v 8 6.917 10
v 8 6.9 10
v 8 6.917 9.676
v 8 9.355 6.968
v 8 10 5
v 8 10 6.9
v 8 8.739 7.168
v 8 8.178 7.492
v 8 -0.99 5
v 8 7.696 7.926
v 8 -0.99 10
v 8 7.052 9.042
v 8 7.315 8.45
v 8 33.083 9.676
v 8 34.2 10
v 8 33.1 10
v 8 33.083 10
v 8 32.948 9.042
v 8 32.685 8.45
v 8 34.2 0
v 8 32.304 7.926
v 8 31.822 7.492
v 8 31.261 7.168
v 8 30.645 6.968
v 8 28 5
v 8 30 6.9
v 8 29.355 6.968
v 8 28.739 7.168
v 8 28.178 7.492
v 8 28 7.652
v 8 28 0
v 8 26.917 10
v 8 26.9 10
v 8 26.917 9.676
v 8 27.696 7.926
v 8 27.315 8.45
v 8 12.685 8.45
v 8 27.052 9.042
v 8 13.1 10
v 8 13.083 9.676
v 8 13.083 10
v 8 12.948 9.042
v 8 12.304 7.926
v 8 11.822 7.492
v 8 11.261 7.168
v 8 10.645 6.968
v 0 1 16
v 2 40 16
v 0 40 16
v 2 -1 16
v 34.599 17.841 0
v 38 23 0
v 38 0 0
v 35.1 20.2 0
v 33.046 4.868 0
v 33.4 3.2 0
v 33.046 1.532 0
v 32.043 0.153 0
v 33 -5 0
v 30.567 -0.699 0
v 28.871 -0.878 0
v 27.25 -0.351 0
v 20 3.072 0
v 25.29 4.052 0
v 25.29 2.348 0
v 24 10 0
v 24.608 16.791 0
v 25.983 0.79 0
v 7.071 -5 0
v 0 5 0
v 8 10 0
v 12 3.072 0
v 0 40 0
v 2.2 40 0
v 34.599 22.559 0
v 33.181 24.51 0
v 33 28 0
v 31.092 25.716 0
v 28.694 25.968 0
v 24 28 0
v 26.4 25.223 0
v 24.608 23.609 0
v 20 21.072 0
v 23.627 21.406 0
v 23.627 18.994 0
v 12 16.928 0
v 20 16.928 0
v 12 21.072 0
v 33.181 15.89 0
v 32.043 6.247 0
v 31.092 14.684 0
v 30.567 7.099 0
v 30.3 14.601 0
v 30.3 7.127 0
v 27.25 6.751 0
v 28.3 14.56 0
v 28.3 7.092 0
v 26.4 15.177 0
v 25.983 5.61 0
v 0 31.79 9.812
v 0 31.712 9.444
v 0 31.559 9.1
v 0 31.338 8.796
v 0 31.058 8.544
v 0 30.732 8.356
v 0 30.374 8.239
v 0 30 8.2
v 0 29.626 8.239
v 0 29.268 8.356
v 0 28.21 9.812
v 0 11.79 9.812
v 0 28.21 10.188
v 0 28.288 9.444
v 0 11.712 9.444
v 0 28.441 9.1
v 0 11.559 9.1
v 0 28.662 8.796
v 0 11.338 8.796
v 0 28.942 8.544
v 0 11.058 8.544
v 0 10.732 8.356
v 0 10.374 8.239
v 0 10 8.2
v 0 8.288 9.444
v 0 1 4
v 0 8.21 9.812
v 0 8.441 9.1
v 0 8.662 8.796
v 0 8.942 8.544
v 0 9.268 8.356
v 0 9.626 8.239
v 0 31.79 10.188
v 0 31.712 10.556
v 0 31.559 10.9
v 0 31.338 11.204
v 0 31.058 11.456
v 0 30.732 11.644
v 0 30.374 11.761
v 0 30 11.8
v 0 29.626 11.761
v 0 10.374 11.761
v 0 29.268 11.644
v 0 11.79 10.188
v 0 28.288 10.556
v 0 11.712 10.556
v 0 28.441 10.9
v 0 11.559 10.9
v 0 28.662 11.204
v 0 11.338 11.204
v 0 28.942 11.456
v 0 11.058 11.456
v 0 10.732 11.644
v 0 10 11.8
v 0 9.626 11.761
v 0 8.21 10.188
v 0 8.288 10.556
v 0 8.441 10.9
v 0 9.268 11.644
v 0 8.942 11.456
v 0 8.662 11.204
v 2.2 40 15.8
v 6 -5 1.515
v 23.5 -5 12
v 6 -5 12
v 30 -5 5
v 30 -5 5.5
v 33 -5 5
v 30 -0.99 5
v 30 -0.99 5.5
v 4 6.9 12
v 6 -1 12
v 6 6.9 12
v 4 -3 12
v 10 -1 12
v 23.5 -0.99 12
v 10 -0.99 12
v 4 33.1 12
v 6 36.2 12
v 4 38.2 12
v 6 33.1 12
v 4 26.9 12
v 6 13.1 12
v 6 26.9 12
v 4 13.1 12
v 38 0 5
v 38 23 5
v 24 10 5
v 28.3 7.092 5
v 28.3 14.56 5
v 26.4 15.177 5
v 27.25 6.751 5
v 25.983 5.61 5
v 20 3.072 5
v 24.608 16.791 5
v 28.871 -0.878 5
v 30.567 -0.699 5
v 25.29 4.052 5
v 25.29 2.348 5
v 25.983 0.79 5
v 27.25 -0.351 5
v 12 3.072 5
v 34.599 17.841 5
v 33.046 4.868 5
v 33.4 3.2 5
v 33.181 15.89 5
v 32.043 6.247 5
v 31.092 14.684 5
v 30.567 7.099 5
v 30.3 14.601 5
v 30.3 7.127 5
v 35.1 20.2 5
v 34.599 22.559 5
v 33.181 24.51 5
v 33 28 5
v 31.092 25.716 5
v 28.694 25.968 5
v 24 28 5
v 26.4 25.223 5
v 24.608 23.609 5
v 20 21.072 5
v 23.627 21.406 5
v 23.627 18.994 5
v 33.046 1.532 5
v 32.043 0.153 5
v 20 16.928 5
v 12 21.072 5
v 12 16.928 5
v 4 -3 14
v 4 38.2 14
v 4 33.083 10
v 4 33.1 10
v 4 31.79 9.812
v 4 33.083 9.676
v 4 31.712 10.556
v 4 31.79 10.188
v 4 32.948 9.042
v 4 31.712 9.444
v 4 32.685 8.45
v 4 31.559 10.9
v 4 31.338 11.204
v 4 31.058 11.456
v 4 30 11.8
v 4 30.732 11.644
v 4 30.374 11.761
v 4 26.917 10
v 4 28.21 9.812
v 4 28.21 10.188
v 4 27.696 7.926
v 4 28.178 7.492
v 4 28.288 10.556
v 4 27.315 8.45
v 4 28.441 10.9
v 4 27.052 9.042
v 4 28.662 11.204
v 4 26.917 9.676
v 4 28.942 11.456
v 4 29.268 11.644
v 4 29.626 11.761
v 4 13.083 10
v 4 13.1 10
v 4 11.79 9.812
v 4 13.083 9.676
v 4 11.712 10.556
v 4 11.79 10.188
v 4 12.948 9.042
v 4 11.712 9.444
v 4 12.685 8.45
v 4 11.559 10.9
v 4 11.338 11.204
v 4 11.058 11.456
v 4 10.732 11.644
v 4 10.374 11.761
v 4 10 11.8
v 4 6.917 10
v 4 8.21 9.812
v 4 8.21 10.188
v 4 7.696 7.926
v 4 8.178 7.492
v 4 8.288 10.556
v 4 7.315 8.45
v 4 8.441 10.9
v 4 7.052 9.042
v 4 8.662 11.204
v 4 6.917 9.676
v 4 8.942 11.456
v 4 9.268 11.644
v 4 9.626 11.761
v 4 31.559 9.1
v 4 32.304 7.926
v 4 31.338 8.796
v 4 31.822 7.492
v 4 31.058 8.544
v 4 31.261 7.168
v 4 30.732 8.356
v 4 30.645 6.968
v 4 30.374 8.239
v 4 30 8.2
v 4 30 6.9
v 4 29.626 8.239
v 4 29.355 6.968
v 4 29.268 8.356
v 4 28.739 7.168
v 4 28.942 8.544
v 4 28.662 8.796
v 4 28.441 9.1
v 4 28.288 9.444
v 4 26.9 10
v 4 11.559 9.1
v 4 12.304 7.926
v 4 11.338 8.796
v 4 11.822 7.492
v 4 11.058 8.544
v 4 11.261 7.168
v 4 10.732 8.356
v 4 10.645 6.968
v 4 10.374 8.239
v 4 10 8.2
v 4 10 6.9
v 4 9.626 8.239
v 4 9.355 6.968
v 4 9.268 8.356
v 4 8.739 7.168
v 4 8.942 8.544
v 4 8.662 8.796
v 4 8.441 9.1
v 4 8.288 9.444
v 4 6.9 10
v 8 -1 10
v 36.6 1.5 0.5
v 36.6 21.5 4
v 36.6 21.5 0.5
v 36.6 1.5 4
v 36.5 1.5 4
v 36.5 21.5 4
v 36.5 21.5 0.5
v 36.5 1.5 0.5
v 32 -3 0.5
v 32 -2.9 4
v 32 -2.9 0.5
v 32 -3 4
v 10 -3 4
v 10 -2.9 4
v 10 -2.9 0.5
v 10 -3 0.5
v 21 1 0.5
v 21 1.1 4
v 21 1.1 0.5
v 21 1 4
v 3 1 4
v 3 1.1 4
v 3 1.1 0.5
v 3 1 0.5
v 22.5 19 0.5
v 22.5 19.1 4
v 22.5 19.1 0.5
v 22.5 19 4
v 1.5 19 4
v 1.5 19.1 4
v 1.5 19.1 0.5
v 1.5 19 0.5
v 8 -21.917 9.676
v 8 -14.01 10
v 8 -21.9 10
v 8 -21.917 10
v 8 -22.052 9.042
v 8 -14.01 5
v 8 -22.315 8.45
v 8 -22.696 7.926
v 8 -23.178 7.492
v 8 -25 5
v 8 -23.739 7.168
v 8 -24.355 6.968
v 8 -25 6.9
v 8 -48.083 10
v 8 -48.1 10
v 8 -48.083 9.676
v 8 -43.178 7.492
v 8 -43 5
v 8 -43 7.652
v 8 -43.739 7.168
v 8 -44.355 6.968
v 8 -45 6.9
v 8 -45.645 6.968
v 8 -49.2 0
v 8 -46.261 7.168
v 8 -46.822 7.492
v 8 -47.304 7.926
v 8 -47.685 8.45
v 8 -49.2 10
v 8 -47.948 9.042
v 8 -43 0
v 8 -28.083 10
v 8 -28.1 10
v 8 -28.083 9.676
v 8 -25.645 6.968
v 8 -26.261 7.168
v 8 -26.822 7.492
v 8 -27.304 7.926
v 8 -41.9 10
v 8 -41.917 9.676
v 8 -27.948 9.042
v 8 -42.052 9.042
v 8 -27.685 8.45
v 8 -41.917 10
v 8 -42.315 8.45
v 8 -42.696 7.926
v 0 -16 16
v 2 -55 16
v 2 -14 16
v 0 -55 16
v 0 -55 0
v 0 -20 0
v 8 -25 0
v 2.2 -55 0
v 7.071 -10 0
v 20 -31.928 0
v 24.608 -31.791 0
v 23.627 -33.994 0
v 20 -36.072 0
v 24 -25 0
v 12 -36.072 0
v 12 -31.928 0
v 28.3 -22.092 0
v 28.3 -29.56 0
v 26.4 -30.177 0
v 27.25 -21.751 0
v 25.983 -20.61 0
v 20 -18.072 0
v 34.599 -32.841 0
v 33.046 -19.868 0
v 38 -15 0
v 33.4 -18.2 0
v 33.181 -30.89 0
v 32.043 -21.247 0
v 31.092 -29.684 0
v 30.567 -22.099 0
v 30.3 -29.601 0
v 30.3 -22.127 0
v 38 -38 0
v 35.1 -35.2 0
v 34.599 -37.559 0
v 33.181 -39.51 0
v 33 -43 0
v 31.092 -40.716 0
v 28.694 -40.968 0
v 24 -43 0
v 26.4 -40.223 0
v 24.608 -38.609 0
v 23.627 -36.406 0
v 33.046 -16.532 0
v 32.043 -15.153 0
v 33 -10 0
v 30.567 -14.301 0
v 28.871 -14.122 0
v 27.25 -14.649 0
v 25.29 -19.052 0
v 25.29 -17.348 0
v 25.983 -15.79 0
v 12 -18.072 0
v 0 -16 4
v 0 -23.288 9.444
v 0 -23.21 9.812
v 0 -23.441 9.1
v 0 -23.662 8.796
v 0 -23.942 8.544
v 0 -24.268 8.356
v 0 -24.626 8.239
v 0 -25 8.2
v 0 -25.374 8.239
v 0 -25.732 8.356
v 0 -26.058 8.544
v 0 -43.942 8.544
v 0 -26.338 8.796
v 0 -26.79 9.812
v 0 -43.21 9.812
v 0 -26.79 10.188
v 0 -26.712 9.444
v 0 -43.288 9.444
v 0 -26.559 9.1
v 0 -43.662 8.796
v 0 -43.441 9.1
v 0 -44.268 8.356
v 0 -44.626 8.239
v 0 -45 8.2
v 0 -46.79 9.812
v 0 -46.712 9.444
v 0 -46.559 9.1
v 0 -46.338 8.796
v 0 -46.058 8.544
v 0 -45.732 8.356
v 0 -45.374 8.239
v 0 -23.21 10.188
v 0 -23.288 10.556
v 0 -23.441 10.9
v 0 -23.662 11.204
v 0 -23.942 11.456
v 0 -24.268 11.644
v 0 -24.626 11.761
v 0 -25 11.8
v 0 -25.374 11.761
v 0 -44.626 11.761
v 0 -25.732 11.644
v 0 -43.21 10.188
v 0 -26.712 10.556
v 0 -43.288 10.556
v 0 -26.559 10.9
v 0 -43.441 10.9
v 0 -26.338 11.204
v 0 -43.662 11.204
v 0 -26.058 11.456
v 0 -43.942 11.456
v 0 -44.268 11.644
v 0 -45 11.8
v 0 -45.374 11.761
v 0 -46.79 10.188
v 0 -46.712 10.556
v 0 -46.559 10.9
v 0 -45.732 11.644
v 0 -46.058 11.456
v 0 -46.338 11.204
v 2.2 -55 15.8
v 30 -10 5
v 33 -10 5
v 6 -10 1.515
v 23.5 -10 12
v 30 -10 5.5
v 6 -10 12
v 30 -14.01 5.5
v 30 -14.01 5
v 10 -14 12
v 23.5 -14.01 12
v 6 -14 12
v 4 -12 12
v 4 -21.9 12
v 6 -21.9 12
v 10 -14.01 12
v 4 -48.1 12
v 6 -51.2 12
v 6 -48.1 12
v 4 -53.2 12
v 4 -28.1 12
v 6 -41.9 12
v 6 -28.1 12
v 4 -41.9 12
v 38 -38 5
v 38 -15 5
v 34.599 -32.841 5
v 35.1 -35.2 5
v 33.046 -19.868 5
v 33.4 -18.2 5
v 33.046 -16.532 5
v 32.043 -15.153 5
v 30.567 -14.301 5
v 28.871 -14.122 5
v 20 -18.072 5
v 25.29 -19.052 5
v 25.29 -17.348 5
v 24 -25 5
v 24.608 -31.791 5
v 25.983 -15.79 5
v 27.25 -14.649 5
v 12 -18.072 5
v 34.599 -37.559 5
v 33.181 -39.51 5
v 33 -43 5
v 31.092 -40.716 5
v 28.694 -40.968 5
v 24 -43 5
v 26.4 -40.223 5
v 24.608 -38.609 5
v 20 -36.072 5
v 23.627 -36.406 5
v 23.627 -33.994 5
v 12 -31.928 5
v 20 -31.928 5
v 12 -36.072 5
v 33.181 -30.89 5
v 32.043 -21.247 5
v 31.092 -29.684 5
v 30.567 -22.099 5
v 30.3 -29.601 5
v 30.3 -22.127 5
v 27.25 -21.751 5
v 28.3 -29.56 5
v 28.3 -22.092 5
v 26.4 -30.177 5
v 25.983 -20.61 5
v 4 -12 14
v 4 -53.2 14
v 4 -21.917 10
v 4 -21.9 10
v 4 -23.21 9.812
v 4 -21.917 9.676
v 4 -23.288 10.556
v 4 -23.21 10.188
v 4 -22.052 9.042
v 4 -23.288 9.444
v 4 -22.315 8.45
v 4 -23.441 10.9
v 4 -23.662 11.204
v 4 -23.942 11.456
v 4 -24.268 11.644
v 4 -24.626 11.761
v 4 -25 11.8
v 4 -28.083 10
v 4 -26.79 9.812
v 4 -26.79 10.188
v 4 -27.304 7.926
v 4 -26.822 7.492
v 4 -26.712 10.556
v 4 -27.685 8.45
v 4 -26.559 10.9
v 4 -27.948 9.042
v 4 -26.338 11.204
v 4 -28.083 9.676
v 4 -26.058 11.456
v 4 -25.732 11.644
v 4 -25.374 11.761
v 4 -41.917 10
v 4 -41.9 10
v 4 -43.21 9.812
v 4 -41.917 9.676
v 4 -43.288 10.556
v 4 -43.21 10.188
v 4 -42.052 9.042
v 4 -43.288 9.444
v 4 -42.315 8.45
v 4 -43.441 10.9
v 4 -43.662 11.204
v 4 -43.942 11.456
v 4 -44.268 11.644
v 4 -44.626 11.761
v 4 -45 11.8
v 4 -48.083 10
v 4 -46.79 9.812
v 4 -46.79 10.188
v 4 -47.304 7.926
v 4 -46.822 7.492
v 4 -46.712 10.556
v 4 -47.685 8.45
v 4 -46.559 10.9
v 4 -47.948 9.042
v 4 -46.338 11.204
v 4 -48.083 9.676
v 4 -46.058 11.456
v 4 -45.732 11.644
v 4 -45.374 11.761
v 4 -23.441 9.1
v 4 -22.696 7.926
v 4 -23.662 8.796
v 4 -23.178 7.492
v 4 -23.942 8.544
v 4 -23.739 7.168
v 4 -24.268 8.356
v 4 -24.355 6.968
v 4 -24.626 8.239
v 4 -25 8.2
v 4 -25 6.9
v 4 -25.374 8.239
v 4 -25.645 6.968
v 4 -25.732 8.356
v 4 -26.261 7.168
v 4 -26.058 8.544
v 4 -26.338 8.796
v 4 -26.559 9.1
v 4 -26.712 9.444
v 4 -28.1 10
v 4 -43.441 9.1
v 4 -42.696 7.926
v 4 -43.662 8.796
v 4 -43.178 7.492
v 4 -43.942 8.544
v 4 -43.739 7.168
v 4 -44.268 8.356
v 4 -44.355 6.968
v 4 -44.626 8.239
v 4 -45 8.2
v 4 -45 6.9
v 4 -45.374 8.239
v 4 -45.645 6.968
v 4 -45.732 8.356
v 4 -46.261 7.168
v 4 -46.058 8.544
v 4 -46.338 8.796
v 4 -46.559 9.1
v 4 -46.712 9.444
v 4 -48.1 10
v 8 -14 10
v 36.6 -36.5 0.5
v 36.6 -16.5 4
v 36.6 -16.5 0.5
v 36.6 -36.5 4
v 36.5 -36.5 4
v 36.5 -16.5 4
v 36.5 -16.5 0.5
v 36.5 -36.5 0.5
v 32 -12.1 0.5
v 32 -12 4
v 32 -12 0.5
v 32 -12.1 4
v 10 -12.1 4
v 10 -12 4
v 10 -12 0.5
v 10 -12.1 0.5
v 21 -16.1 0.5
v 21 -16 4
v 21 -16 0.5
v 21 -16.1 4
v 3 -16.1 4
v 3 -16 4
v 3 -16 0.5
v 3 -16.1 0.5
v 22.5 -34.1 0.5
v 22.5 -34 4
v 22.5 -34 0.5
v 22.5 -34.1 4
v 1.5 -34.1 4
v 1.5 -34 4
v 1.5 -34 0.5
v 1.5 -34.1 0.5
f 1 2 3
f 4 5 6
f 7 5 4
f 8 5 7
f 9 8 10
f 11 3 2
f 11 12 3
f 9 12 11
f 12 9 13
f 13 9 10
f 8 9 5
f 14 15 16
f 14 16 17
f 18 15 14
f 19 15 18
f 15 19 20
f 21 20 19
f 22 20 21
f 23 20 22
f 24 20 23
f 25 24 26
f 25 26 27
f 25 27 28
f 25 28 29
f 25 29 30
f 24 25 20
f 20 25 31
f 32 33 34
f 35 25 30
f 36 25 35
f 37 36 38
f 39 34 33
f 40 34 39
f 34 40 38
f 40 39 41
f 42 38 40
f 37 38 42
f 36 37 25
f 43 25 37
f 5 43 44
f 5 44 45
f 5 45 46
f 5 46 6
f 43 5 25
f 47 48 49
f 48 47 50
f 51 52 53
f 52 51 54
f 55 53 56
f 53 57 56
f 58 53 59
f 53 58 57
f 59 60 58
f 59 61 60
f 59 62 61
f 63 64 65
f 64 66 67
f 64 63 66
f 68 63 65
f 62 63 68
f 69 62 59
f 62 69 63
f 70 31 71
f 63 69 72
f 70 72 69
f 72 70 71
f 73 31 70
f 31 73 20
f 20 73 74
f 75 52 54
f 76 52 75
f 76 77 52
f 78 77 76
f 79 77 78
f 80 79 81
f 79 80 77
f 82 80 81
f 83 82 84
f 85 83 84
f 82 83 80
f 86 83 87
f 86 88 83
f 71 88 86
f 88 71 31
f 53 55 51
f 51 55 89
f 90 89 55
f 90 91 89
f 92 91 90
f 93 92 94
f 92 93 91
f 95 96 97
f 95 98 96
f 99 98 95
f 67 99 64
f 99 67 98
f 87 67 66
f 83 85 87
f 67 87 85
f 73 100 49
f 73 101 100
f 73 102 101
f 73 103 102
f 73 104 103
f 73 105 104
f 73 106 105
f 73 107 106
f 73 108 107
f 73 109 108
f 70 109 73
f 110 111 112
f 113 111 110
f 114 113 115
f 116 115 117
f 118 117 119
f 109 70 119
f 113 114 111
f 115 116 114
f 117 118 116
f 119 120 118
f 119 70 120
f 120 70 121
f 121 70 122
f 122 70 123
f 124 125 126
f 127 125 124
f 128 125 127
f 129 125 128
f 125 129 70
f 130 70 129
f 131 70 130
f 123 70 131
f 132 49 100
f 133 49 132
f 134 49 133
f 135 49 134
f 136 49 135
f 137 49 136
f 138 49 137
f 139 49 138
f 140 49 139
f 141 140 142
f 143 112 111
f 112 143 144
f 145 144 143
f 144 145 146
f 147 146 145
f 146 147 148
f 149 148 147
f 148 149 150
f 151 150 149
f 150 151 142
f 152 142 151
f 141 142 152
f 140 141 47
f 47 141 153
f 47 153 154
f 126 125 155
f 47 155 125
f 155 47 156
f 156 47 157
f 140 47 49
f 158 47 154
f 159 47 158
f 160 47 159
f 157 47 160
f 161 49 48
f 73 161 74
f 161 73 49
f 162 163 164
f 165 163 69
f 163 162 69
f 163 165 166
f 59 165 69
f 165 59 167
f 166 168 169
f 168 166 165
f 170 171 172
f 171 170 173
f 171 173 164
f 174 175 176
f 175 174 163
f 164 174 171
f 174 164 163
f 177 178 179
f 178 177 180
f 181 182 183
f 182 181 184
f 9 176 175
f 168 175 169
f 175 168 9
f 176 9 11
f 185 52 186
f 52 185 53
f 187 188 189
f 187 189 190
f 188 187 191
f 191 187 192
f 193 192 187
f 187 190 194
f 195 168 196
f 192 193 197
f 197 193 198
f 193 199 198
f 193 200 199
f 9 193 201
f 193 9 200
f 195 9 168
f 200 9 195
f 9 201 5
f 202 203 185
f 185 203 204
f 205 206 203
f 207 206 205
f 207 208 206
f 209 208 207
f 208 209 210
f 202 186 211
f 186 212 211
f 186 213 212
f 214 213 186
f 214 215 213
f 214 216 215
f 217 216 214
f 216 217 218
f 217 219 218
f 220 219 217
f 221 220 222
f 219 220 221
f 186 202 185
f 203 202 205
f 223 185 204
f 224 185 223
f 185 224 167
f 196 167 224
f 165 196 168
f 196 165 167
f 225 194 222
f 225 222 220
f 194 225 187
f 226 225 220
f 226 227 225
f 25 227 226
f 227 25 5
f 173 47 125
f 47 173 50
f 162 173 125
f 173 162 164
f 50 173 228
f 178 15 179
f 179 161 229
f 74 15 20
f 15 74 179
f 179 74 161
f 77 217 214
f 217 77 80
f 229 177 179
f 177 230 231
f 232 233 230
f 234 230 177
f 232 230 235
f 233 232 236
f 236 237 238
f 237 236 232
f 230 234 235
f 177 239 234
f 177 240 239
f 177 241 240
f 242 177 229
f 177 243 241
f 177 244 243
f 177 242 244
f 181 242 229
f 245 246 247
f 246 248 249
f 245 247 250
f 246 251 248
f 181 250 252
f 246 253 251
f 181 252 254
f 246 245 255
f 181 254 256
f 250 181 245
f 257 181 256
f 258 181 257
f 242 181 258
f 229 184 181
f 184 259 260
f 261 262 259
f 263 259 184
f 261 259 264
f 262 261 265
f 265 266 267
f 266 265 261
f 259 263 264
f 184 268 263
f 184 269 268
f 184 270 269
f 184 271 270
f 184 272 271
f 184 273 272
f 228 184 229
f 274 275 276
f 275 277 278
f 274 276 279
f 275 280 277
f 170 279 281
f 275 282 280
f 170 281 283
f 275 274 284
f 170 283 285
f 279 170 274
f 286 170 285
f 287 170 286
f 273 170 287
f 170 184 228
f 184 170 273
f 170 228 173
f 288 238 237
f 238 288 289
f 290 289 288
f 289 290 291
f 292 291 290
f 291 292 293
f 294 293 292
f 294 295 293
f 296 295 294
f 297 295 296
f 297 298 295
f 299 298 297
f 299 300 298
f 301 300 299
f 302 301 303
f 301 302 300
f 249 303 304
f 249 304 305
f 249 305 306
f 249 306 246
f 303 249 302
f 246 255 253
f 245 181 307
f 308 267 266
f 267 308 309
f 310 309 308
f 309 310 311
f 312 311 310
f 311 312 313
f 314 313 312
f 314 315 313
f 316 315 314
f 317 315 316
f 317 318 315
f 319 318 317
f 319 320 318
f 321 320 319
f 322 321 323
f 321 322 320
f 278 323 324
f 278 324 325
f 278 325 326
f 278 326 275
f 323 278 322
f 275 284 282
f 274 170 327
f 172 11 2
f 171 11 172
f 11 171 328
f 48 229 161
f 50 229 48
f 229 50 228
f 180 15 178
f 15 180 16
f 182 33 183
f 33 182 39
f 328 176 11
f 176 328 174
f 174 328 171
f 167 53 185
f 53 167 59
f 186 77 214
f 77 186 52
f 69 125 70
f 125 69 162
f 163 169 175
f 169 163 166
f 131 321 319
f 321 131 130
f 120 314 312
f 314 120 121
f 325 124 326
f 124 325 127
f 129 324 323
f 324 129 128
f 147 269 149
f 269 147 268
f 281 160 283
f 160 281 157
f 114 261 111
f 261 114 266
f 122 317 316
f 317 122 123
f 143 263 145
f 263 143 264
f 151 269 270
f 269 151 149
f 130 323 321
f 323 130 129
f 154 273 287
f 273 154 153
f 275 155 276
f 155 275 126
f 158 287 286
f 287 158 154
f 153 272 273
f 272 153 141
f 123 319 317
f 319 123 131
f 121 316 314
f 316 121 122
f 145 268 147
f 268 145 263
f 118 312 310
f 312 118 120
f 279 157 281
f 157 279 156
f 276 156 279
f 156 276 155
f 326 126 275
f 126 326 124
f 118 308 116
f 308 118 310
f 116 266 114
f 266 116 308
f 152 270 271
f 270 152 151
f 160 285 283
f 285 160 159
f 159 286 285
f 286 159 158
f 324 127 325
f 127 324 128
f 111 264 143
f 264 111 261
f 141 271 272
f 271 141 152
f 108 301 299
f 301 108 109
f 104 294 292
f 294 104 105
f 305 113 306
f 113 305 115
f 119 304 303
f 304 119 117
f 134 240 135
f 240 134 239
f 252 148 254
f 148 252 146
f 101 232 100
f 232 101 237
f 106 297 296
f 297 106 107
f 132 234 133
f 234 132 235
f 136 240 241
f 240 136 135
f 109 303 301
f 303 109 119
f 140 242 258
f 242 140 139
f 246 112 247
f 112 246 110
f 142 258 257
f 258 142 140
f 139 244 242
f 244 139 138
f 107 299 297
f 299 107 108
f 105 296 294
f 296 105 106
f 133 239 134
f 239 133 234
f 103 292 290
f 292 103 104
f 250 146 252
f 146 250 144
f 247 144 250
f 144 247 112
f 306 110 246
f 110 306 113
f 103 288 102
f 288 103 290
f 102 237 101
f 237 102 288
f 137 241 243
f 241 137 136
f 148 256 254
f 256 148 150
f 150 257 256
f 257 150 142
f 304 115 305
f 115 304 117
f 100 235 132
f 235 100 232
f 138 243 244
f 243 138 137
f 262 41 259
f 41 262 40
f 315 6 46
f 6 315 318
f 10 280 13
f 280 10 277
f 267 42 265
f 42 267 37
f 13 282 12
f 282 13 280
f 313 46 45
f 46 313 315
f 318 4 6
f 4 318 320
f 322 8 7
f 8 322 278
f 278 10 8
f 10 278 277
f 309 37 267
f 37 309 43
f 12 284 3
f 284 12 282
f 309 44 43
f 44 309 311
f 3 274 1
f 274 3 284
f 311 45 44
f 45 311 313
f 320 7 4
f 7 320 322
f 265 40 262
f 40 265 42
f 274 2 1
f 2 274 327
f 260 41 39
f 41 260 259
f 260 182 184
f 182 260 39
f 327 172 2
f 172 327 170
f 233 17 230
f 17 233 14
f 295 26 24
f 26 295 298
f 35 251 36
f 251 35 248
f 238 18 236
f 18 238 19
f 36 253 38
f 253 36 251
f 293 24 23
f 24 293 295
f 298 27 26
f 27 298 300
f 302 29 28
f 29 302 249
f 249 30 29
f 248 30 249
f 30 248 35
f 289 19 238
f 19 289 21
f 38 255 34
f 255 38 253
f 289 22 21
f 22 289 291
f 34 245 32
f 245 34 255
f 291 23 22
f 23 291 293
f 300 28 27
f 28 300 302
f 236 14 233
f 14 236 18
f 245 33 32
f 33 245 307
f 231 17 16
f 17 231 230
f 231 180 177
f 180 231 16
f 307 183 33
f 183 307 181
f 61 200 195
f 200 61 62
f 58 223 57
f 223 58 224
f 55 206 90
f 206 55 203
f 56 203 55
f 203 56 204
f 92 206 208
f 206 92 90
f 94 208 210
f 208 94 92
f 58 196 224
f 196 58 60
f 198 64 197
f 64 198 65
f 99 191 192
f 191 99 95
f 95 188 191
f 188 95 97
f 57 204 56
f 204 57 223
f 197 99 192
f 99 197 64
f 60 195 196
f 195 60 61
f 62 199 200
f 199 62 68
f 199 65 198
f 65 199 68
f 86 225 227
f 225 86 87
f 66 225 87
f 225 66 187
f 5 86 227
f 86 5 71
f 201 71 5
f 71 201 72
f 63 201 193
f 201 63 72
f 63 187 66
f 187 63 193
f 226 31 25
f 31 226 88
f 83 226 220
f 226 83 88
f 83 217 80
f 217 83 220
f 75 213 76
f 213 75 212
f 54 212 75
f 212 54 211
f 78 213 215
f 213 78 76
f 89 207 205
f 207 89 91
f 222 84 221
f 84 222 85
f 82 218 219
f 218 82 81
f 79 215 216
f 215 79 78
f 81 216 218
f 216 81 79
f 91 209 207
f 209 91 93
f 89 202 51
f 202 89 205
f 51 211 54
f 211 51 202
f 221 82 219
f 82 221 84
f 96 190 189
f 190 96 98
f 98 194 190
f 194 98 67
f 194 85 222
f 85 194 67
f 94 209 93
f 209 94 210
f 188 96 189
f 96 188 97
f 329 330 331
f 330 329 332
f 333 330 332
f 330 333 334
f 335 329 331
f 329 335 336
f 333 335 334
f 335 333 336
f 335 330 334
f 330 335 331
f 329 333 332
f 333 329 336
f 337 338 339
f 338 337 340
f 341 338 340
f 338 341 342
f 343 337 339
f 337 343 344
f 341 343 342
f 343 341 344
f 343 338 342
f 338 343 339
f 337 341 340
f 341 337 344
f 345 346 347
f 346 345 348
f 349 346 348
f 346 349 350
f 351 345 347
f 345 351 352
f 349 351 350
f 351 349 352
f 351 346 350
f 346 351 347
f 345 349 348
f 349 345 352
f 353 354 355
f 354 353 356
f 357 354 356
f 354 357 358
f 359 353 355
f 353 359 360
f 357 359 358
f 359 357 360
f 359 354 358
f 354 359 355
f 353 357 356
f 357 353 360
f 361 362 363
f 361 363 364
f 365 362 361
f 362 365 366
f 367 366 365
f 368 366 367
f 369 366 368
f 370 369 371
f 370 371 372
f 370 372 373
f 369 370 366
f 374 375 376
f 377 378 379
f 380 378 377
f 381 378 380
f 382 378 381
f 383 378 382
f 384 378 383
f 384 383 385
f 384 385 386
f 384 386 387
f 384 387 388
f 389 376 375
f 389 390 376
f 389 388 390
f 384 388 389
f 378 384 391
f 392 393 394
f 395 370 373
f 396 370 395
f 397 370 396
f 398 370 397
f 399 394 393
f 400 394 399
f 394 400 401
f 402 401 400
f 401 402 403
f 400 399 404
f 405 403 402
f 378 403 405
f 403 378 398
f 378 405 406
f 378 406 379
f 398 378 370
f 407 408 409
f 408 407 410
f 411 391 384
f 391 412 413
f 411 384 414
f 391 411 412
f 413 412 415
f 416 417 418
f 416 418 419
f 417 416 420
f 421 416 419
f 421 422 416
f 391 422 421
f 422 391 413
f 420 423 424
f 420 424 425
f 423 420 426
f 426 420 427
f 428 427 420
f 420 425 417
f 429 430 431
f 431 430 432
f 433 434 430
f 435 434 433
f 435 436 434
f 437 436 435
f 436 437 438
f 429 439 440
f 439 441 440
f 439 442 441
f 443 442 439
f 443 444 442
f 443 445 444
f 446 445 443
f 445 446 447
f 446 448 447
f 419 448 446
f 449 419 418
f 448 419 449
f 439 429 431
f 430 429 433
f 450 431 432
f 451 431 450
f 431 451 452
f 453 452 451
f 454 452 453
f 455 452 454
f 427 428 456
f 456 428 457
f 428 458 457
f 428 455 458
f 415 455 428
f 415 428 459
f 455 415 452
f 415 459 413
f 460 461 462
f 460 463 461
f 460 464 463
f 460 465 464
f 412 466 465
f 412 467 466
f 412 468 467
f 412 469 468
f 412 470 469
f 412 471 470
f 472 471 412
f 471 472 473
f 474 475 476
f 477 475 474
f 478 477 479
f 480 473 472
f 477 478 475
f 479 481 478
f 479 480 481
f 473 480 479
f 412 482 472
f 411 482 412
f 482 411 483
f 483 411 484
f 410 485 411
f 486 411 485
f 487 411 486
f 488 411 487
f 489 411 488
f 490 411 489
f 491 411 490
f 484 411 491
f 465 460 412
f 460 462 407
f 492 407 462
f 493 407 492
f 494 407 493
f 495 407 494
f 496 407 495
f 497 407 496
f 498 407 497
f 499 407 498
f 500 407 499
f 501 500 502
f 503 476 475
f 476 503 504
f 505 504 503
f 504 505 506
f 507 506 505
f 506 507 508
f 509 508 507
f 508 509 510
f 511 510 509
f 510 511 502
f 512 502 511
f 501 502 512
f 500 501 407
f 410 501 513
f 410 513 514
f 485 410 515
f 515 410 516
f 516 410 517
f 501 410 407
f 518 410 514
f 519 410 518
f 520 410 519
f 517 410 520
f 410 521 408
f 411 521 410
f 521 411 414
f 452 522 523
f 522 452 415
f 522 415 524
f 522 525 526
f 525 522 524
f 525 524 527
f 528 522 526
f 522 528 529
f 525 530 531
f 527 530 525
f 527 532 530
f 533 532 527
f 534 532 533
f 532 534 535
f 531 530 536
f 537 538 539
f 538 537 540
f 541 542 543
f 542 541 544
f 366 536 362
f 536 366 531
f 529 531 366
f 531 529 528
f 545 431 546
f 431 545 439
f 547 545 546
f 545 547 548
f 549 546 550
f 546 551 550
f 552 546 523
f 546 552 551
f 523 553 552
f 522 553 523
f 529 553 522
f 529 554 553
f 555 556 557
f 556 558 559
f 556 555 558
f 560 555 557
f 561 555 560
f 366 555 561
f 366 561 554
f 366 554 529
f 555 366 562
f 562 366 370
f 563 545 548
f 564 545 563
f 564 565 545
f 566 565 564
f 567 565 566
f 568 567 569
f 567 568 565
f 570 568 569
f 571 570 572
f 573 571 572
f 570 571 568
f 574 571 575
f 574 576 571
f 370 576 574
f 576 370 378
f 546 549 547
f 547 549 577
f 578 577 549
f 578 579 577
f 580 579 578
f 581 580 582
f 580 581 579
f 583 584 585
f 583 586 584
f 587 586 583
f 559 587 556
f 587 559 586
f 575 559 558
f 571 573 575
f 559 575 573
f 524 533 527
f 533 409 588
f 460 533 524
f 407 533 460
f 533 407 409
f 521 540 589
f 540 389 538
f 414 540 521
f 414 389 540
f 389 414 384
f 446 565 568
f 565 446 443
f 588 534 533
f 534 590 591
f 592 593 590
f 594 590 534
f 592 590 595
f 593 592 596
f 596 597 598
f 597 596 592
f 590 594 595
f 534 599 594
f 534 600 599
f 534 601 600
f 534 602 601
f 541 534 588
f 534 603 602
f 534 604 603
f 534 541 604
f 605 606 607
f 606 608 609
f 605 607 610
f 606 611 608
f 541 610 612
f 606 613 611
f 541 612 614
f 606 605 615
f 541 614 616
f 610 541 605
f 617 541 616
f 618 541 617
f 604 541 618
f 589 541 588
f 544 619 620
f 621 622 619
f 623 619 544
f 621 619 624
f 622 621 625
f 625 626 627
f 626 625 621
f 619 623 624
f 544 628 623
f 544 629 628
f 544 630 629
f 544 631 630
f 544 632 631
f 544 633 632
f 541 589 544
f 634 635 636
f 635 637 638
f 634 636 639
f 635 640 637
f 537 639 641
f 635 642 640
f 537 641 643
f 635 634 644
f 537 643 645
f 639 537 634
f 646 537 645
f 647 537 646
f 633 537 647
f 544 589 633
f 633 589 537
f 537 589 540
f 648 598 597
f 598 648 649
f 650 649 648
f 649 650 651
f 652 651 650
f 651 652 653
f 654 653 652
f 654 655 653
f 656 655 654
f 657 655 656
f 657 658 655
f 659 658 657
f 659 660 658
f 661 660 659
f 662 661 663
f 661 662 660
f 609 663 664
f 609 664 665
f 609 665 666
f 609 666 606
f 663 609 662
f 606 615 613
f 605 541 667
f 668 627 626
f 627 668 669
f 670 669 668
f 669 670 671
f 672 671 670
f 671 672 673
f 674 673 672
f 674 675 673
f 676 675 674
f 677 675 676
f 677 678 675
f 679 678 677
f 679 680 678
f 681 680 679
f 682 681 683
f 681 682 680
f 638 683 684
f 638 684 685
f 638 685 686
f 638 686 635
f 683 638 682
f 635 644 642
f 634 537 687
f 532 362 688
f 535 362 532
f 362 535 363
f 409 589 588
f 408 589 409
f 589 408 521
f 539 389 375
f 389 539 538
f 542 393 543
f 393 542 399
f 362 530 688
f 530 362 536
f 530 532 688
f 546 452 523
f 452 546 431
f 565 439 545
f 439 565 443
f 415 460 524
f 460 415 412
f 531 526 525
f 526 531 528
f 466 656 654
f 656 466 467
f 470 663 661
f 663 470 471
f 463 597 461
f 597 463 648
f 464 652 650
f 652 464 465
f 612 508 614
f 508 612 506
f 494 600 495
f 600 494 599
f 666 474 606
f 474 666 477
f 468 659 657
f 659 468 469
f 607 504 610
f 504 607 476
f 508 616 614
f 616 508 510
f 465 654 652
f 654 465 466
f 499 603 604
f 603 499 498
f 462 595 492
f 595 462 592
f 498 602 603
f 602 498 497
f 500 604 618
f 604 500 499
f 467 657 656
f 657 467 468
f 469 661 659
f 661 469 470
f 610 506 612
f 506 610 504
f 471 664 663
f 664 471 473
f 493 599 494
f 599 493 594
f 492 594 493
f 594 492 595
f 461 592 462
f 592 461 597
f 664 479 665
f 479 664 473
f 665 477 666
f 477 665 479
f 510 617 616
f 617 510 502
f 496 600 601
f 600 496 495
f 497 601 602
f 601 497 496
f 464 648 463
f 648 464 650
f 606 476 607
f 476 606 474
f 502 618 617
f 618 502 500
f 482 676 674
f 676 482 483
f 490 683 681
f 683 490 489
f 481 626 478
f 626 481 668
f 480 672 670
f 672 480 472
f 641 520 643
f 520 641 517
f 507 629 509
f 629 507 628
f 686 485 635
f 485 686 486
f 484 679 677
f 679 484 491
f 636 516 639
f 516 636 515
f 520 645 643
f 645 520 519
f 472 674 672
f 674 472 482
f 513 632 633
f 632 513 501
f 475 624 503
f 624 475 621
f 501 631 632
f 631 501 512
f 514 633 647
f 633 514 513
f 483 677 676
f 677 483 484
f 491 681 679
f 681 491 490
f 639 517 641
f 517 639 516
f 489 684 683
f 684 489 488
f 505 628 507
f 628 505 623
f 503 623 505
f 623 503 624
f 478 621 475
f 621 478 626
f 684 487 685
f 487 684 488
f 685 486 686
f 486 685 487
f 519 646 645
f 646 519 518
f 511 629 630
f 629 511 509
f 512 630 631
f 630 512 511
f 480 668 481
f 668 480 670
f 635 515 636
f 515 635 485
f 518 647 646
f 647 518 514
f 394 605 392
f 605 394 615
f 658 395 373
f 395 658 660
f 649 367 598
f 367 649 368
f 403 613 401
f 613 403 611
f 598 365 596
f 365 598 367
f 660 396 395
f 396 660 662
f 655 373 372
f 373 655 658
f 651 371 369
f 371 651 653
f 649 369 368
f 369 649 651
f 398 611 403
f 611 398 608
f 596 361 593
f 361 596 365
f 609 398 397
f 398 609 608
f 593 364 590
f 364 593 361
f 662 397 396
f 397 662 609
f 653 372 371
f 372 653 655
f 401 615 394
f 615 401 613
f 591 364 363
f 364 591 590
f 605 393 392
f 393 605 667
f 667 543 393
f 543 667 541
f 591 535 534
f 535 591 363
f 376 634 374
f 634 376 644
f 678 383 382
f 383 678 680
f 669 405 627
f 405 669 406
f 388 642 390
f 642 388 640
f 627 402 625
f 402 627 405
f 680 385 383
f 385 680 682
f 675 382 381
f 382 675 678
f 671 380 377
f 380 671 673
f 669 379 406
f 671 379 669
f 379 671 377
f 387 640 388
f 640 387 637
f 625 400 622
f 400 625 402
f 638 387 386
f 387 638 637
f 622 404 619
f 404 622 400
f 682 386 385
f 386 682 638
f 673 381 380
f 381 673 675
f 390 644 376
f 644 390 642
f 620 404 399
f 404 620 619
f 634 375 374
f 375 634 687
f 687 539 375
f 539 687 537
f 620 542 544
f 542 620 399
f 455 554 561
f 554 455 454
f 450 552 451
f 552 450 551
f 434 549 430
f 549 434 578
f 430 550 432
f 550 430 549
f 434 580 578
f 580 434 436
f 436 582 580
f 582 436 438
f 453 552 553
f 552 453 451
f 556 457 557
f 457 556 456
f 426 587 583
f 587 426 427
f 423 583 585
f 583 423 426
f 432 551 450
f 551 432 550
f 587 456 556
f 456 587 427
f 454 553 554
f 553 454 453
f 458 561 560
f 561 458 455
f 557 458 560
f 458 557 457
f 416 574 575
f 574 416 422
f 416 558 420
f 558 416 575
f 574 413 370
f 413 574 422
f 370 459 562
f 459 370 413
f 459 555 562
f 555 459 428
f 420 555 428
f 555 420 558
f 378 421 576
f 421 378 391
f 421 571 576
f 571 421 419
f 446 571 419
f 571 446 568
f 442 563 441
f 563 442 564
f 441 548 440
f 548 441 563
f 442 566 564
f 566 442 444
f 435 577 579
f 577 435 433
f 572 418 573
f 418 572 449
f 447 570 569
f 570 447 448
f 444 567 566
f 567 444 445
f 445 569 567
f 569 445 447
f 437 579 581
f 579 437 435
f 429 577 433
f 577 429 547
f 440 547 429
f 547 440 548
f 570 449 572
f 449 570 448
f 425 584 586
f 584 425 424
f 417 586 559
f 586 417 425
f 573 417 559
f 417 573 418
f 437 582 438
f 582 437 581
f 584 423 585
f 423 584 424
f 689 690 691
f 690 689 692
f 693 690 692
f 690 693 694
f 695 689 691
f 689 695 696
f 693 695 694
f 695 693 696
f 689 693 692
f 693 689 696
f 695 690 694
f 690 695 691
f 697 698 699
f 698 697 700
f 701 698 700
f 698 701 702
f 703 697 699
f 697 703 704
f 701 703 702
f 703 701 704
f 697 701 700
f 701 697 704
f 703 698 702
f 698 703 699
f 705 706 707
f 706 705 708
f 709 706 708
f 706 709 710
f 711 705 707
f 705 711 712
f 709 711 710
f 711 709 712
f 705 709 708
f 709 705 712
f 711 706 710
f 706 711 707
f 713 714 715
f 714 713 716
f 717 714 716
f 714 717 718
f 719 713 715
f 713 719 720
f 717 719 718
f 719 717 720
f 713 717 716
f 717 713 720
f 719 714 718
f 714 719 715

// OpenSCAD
// PRUSA iteration3
// Z axis top holder
// GNU GPL v3
// Josef Průša <iam@josefprusa.cz> and contributors
// http://www.reprap.org/wiki/Prusa_Mendel
// http://prusamendel.org


module z_top_base(){
    translate([0,-5,0]) cube([8,45,16]); // Plate touching the base
    translate([0,-5,0]) cube([30,4.01,12]); // Plate touching the base
    translate([0,-5,0]) cube([38,45,5]); // Plate touching the base
}

module z_top_fancy(){
    // Corner cutouts
    translate([0.5,0.5,0]) rotate([0,0,-45-180]) translate([-15,0,-1]) cube([30,30,51]);

    translate([-13,40+5+10.2,0]) rotate([0,0,-45-0]) translate([0,0,-1]) cube([30,30,51]); // Frame side angle
    translate([8,28,0]) translate([0,0,-1]) cube([50,50,51]);

    translate([4,0,12]) rotate([0,0, 0]) translate([0,-5,0]) cube([30,50,30]);
    translate([6,0,12]) rotate([0,-45, 0]) translate([0,-5,0]) cube([30,50,30]);
    translate([8,4,10]) rotate([0,-45, 0]) translate([0,-5,0]) cube([30,50,30]);

    translate([38-2.5,-5+2.5,0]) rotate([0,0,-45-90]) translate([-15,0,-1]) cube([30,30,51]);
    translate([35,26,0]) rotate([0,0,-45]) translate([-15,0,-1]) cube([30,30,51]); // outer corner
    translate([0,0,5]) rotate([45+180,0,0]) rotate([0,0,-45+90]) translate([0,0,-15]) cube([30,30,30]);

    // Stiffner cut out
    translate([30,0,5.5]) rotate([0,-45,0]) translate([0,-5,0]) cube([30,50,30]);
}

module z_top_holes(){
    // Screw holes frame
    translate([-1,10,10]) rotate([0,90,0]) cylinder(h=20,r=1.8,$fn=30);
    translate([-1,10+20,10]) rotate([0,90,0]) cylinder(h=20,r=1.8,$fn=30);

    // Screw heads
    translate([4,10,10]) rotate([0,90,0]) cylinder(h=20,r=3.1,$fn=30);
    translate([4,10-3.1,10]) cube([10,6.2,10]);
    translate([4,10+20,10]) rotate([0,90,0]) cylinder(h=20,r=3.1,$fn=30);
    translate([4,10+20-3.1,10]) cube([10,6.2,10]);

    // Z rod holder
    translate([25+4.3,3.2,-1]) rotate([0,0,0]) cylinder(h=50,r=4.1,$fn=15);

    // material saving cut
    translate([16,10,-1]) rotate([0,0,0])cylinder(h=50,r=8,$fn=6);
    translate([16,28,-1]) rotate([0,0,0])cylinder(h=50,r=8,$fn=6);
    translate([25+4.3,3.2+17,-1]) rotate([0,0,0]) cylinder(h=50,r=5.8,$fn=15); // Screw hole

    translate([25+4.3-1,3,-1]) cube([2,15,7]); // It's bit up because it helps with printing

    // Selective infill
    translate([36.5,1.5,0.5]) cube([0.1,20,3.5]);
    translate([10,-3,0.5]) cube([22,0.1,3.5]);
    translate([3,1,0.5]) cube([18,0.1,3.5]);
    translate([1.5,19,0.5]) cube([21,0.1,3.5]);
}

module z_top_right(){
    difference(){
        z_top_base();
        z_top_fancy();
        z_top_holes();
    }
}

module z_top_left(){
    translate([0,-15,0]) mirror([0,1,0]) difference(){
        z_top_base();
        z_top_fancy();
        z_top_holes();
    }
}

// Final parts
z_top_left();
z_top_right();
